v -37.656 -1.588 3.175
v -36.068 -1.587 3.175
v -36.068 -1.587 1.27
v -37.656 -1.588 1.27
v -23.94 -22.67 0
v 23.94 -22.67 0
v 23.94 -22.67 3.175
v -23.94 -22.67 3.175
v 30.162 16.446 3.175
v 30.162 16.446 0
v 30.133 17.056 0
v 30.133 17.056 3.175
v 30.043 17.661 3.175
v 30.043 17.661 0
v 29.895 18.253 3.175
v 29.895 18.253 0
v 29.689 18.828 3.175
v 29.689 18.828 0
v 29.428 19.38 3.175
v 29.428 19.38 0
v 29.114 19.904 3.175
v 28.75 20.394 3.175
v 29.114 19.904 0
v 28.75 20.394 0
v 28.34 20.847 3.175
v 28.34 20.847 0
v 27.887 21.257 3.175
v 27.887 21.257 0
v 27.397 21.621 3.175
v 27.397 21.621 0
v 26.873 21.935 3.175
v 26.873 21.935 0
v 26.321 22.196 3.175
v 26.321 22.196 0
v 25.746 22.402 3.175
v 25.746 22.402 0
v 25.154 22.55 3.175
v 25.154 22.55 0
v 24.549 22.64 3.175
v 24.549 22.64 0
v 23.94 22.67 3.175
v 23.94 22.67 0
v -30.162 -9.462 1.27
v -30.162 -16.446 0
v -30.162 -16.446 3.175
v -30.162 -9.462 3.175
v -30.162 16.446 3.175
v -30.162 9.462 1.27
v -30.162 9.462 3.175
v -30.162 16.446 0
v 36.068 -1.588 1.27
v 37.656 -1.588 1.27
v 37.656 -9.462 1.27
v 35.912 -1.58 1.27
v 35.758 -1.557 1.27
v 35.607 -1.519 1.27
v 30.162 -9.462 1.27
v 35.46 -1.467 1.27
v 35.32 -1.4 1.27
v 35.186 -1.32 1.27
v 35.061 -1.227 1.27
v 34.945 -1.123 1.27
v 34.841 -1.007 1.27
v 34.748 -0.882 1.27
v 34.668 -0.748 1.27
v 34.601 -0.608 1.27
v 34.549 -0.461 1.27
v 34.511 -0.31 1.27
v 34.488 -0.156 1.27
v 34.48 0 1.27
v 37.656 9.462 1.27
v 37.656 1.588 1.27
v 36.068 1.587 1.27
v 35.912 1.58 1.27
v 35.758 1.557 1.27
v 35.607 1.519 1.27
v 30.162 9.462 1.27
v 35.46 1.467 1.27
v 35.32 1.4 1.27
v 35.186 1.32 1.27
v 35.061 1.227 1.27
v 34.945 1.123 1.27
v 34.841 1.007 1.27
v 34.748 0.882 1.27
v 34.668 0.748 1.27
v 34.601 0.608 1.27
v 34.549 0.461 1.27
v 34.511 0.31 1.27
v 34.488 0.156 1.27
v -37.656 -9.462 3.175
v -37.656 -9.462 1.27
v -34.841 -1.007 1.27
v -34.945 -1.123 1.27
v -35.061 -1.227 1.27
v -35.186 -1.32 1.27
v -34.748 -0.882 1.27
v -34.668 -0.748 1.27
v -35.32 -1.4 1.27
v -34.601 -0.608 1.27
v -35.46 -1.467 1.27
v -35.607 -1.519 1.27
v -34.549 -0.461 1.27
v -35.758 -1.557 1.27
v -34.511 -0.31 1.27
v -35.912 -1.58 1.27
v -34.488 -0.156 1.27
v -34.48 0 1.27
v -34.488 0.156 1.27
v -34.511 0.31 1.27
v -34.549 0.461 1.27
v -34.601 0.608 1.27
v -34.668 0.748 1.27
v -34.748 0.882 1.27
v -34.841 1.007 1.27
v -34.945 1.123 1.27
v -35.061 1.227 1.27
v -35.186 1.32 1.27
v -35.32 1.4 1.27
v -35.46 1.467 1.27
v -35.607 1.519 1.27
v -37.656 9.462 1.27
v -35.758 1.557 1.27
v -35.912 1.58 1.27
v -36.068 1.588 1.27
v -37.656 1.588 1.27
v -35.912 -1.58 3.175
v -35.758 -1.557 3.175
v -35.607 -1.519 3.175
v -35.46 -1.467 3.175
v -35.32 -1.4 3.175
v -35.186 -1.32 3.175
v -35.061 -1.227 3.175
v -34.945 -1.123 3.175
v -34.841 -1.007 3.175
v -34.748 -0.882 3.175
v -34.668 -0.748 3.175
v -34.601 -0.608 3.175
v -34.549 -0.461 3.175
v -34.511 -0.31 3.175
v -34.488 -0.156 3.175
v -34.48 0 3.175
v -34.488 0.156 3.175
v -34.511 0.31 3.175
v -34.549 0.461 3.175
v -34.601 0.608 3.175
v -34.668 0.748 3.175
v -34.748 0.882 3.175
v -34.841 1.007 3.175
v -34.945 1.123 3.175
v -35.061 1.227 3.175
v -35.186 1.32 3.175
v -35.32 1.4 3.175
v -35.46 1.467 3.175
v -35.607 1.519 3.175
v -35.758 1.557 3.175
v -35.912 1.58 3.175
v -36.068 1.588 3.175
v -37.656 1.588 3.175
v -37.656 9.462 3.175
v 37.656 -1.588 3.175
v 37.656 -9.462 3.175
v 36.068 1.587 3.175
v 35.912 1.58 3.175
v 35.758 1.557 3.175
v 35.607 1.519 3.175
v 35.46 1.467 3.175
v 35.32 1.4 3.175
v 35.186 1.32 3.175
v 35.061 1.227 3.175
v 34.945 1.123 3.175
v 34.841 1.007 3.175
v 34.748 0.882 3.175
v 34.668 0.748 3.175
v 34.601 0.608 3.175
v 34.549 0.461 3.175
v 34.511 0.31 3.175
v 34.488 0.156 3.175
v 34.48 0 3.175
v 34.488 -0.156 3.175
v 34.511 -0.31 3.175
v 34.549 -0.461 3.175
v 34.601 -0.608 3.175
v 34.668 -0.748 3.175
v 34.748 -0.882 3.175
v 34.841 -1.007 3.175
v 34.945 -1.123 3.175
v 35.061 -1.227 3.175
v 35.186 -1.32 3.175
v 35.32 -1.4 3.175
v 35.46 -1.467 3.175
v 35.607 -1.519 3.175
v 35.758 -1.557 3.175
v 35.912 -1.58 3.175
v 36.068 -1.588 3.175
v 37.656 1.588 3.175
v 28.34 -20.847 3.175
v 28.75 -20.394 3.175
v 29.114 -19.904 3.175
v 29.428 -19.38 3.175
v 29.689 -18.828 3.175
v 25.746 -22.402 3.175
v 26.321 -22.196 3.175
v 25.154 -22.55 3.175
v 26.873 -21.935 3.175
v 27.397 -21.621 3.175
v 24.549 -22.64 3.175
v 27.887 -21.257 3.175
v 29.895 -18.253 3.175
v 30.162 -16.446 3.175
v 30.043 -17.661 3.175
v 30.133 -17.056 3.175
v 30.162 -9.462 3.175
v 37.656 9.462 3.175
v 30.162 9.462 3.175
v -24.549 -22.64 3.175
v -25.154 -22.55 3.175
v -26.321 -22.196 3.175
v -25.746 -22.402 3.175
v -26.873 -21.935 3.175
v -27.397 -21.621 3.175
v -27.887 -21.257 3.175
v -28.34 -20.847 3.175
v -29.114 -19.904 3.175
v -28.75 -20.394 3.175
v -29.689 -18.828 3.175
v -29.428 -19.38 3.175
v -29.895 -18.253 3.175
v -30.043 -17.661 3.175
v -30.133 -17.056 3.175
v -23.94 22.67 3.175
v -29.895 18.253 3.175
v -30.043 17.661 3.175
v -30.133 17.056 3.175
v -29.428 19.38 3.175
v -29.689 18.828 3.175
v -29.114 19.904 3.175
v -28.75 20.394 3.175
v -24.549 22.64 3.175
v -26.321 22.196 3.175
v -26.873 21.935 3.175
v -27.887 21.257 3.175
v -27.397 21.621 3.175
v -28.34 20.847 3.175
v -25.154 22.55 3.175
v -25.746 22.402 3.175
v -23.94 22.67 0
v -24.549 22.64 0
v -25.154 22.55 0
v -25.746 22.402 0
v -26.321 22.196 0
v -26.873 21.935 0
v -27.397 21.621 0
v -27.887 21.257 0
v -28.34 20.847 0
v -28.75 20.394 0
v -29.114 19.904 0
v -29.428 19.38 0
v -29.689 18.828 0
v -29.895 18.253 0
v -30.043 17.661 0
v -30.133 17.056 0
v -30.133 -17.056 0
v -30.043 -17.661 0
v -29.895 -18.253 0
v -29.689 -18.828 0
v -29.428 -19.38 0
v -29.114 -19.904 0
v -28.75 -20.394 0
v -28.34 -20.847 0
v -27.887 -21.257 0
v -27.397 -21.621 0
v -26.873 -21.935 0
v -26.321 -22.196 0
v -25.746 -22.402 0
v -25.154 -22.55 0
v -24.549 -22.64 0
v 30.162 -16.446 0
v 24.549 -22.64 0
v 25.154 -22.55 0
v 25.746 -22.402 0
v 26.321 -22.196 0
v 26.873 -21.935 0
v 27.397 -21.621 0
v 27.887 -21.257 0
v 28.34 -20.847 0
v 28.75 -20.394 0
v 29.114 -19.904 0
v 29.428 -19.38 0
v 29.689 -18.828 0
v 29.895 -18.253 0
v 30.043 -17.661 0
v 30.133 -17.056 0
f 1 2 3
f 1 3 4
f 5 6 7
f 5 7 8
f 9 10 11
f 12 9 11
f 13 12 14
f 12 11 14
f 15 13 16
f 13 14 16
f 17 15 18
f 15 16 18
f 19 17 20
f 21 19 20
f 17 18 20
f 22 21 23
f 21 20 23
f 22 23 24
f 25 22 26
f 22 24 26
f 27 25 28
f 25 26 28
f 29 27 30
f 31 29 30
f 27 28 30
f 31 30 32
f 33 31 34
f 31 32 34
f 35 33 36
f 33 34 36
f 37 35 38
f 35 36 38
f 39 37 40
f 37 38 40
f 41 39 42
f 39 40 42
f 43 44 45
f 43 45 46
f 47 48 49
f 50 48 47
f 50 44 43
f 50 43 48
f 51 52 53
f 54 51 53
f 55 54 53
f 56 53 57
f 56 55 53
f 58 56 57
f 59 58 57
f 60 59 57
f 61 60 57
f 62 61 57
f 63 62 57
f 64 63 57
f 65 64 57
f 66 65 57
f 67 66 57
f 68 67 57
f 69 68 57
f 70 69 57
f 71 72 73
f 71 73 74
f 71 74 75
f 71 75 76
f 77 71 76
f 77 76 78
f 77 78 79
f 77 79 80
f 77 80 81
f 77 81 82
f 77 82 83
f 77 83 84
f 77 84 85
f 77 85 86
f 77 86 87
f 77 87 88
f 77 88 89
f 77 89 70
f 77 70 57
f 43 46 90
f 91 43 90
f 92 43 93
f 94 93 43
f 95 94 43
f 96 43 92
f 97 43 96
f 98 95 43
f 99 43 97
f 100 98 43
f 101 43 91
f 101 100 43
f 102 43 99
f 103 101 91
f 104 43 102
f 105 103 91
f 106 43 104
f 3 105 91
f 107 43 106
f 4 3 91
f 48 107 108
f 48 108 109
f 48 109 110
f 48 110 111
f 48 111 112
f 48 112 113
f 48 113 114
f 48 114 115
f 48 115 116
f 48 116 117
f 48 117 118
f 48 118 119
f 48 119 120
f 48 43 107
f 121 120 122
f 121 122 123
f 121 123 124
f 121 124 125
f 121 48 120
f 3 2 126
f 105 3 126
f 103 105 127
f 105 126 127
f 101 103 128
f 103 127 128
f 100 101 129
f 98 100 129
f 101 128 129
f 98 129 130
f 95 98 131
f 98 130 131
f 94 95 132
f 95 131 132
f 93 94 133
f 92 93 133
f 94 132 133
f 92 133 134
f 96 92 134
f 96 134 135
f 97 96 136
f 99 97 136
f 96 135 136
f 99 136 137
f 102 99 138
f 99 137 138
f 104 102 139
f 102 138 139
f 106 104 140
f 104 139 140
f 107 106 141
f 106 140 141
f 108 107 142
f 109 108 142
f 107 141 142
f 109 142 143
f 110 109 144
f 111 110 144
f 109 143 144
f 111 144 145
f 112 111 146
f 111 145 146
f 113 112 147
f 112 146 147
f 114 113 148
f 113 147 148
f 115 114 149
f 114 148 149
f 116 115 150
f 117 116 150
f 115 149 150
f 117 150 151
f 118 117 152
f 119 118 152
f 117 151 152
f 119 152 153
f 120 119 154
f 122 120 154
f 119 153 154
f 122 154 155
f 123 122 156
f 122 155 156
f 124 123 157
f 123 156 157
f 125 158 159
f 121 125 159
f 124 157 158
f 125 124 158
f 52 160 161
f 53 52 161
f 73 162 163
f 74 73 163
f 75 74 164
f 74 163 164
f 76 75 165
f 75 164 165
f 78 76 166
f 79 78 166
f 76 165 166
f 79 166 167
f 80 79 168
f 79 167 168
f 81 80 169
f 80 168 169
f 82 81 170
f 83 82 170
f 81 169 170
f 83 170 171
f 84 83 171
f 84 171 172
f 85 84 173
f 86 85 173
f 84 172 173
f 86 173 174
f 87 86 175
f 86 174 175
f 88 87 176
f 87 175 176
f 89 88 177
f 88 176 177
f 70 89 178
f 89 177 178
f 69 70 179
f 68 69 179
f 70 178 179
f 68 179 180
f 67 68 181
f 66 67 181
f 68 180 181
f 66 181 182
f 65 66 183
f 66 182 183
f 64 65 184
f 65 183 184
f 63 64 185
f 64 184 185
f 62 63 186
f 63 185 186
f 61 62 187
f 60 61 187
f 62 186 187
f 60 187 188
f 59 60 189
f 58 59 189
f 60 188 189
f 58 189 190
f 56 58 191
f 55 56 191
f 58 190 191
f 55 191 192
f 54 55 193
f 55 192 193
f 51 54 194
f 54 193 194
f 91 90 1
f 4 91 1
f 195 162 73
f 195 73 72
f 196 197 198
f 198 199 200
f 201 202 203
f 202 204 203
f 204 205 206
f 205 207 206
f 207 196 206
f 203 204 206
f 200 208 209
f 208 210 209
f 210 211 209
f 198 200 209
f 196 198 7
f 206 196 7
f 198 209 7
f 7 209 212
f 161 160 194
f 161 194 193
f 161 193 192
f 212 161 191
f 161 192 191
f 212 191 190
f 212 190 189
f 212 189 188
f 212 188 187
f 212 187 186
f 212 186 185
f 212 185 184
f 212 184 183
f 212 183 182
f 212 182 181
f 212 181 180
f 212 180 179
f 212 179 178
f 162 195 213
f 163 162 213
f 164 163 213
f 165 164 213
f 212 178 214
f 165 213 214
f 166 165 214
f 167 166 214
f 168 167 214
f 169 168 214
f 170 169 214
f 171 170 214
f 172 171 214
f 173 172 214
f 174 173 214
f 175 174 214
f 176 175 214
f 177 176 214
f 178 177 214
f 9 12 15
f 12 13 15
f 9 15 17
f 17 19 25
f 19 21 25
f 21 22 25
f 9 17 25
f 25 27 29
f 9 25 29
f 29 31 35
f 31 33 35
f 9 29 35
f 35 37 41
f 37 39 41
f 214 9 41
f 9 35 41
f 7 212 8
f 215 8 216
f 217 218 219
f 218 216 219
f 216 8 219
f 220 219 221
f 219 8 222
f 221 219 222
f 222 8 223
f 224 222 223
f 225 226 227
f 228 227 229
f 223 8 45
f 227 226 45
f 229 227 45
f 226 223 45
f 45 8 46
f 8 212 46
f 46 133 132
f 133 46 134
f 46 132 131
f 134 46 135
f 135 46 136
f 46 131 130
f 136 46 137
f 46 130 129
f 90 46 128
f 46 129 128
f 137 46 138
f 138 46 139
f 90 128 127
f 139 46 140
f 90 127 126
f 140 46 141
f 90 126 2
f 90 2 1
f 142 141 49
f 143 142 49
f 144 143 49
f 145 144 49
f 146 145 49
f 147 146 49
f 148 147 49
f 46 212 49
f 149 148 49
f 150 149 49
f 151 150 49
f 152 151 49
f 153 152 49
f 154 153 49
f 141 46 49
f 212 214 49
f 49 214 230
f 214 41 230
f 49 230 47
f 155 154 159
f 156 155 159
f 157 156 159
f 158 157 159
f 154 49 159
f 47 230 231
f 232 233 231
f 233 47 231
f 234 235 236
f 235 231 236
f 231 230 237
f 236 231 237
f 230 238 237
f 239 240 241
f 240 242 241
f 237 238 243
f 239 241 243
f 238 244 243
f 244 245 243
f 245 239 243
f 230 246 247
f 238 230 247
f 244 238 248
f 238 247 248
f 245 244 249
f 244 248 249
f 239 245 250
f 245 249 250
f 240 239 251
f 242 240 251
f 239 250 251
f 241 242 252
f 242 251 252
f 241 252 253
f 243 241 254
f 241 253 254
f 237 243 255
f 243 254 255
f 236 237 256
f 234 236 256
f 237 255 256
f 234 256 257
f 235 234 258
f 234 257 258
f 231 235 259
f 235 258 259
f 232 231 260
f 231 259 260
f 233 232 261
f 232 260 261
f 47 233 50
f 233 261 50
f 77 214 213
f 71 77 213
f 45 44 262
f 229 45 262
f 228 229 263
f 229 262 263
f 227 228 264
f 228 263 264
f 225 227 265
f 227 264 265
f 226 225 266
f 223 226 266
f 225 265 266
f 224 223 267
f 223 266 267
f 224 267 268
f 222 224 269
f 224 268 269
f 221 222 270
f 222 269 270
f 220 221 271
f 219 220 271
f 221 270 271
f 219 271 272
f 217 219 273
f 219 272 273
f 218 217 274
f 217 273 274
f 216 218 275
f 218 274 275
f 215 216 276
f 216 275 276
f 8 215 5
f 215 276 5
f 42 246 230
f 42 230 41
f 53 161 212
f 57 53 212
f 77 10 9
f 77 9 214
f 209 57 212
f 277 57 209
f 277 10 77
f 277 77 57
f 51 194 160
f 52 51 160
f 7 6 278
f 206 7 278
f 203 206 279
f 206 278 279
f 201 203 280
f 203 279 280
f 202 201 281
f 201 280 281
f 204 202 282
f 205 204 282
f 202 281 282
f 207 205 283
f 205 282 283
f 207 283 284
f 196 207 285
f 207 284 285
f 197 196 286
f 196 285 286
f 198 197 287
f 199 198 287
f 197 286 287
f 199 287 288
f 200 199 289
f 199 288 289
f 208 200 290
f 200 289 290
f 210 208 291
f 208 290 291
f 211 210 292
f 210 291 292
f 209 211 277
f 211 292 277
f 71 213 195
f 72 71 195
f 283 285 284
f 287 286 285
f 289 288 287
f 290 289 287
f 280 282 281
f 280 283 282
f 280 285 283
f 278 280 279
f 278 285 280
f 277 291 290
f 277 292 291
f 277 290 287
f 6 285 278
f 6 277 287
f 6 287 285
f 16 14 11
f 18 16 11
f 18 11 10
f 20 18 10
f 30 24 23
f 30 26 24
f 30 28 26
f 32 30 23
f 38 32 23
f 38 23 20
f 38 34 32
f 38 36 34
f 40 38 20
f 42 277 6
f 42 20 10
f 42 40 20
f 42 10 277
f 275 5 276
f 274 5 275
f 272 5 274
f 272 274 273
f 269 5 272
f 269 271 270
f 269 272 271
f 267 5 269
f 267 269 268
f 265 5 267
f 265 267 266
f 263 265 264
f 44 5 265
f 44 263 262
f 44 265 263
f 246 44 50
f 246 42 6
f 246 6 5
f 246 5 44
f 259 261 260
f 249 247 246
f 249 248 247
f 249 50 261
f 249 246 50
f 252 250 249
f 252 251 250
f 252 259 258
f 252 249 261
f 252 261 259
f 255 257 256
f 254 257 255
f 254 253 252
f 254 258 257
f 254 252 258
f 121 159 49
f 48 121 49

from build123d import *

# Parameters (mm, degrees)
PAD_DEPTH    = 3.175
PAD001_DEPTH = 1.905


with BuildPart() as part:
    # Sketch → Pad (new body)
    with BuildSketch(Plane.XY):
        with BuildLine():
            Line((-30.1625, -16.4465), (-30.1625, 16.4465))
            ThreePointArc((-23.9395, 22.6695), (-28.339825, 20.846825), (-30.1625, 16.4465))
            Line((-23.9395, 22.6695), (23.9395, 22.6695))
            ThreePointArc((30.1625, 16.4465), (28.339825, 20.846825), (23.9395, 22.6695))
            Line((30.1625, 16.4465), (30.1625, -16.4465))
            ThreePointArc((23.9395, -22.6695), (28.339825, -20.846825), (30.1625, -16.4465))
            Line((23.9395, -22.6695), (-23.9395, -22.6695))
            ThreePointArc((-30.1625, -16.4465), (-28.339825, -20.846825), (-23.9395, -22.6695))
        make_face()
    extrude(amount=PAD_DEPTH)

    # Sketch001 (on Face10 of Pad) → Pad001 (join)
    with BuildSketch(Plane.XY.offset(3.175)):
        with BuildLine():
            Line((30.1625, -9.4615), (30.1625, 9.4615))
            Line((30.1625, 9.4615), (37.6555, 9.4615))
            Line((37.6555, 9.4615), (37.6555, 1.5875))
            Line((36.068, 1.5875), (37.6555, 1.5875))
            ThreePointArc((36.068, 1.5875), (34.4805, 0), (36.068, -1.5875))
            Line((36.068, -1.5875), (37.6555, -1.5875))
            Line((37.6555, -1.5875), (37.6555, -9.4615))
            Line((37.6555, -9.4615), (30.1625, -9.4615))
        make_face()
        with BuildLine():
            Line((-37.6555, -9.4615), (-37.6555, -1.5875))
            Line((-36.068, -1.5875), (-37.6555, -1.5875))
            ThreePointArc((-36.068, -1.5875), (-34.4805, 0), (-36.068, 1.5875))
            Line((-36.068, 1.5875), (-37.6555, 1.5875))
            Line((-37.6555, 1.5875), (-37.6555, 9.4615))
            Line((-37.6555, 9.4615), (-30.1625, 9.4615))
            Line((-30.1625, 9.4615), (-30.1625, -9.4615))
            Line((-30.1625, -9.4615), (-37.6555, -9.4615))
        make_face()
    extrude(amount=-PAD001_DEPTH)


solid = part.part
